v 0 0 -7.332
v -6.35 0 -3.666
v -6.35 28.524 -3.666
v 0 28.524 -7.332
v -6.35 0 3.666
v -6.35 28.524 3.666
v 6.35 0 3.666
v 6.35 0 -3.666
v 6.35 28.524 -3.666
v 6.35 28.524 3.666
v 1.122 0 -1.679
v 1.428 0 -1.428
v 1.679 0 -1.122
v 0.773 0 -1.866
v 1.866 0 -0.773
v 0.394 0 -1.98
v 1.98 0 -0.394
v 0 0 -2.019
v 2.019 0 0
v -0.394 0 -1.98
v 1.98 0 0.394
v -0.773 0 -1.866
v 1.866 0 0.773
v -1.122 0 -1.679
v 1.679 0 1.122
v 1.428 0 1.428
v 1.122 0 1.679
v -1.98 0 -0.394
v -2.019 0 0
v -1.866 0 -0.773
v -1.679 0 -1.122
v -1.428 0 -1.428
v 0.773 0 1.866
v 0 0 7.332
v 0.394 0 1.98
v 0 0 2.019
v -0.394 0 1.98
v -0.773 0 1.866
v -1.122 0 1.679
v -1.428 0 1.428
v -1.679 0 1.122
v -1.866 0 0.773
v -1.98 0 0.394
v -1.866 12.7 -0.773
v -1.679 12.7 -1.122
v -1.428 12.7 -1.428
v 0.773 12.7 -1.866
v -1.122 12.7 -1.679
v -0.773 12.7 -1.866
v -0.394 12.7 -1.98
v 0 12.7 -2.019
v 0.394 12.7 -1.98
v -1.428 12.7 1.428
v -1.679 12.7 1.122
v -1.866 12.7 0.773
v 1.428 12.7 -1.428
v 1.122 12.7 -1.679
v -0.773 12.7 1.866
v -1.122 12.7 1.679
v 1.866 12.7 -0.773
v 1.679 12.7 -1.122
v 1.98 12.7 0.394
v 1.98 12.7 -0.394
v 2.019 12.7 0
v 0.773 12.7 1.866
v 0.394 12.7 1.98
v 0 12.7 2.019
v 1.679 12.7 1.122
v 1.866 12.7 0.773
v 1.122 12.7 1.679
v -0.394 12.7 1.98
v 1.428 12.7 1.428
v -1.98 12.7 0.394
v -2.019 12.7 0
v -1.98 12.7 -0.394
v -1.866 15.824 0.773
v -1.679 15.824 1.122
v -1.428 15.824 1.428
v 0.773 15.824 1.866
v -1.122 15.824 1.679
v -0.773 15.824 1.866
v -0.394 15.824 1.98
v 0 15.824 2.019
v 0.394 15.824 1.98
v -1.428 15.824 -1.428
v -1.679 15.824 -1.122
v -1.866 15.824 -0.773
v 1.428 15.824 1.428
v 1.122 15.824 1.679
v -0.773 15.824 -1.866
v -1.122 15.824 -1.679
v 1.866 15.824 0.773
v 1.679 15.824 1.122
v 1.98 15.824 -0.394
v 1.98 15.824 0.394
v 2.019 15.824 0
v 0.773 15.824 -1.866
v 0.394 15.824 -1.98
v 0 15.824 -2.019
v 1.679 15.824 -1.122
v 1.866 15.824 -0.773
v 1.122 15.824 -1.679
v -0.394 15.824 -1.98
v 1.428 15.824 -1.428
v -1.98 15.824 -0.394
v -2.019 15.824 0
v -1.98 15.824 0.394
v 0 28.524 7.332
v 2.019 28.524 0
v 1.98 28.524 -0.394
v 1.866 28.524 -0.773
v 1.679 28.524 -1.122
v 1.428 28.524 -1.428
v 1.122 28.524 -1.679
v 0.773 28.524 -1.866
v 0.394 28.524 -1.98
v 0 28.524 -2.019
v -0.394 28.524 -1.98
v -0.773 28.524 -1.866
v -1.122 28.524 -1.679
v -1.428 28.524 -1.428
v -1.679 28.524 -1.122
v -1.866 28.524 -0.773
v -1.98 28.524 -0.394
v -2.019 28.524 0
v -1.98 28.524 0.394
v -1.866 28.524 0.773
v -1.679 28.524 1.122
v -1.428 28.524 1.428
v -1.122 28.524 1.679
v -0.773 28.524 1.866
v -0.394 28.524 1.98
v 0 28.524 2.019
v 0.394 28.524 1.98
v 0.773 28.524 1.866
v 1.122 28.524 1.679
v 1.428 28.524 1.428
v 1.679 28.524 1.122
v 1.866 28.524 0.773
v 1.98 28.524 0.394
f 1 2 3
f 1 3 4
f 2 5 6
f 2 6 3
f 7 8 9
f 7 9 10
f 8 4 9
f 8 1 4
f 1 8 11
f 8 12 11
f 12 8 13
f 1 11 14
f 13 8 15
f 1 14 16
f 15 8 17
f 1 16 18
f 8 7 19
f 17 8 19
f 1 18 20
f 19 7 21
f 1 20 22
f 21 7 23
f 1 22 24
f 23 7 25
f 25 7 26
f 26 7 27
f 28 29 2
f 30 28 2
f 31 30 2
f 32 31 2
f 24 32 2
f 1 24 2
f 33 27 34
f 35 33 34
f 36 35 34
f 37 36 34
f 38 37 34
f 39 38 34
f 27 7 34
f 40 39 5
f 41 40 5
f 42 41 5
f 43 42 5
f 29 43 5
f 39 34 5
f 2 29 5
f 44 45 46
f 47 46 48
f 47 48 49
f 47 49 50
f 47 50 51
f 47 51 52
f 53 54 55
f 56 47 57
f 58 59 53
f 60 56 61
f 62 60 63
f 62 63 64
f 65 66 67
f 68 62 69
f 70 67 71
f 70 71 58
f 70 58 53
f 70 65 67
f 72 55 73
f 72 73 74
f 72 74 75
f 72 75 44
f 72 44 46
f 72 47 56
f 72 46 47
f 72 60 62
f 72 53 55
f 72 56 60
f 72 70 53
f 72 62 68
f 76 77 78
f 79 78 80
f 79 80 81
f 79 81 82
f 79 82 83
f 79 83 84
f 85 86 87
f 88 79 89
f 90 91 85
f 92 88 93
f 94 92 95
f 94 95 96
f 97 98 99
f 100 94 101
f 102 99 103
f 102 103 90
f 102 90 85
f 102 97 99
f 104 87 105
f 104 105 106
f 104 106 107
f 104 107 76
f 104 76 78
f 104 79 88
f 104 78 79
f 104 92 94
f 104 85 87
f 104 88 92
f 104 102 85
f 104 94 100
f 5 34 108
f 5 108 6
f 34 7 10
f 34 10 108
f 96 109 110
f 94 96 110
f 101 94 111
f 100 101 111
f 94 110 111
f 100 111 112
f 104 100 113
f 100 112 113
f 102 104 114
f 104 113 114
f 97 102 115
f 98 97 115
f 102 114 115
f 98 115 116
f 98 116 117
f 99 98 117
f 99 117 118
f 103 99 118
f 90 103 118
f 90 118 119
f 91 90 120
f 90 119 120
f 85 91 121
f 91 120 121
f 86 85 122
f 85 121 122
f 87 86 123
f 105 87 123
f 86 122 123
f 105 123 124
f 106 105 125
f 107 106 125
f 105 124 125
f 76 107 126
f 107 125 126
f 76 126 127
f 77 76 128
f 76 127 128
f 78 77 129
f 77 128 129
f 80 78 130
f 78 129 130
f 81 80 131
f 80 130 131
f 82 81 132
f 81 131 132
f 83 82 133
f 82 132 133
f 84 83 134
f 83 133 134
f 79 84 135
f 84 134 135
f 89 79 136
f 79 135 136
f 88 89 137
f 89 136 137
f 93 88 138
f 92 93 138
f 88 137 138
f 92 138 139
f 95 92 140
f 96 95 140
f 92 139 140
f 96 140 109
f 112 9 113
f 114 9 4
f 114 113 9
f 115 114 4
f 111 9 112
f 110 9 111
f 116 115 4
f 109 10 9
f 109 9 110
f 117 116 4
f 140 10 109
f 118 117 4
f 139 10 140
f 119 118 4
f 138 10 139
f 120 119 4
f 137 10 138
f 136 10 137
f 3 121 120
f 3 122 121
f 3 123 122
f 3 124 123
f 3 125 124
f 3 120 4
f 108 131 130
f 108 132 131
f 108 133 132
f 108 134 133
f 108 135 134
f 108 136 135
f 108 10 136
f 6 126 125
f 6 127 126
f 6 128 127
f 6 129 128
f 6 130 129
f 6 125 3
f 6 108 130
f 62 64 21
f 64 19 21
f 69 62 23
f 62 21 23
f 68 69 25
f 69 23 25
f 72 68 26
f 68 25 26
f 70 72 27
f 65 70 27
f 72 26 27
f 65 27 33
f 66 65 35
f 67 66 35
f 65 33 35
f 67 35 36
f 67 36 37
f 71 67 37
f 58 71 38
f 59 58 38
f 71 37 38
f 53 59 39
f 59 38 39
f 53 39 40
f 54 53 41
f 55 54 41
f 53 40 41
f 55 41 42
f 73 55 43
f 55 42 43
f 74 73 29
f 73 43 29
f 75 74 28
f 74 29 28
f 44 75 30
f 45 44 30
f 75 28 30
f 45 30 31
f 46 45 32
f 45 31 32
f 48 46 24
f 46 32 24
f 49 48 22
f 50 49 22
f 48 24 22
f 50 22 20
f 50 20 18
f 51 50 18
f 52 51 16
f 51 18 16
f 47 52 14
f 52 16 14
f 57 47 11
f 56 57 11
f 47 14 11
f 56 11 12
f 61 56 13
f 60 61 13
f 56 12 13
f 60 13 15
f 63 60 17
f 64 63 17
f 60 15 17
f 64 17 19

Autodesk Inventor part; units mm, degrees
ref_plane "YZ Plane" through (0, 0, 0) normal (1, 0, 0) x (0, 1, 0)
ref_plane "XZ Plane" through (0, 0, 0) normal (0, 1, 0) x (-1, 0, 0)
ref_plane "XY Plane" through (0, 0, 0) normal (0, 0, 1) x (1, 0, 0)
sketch "Sketch1" plane through (0, 0, 0) normal (0, 1, 0) x (-1, 0, 0)
  line L0 (0, 7.3323) -> (6.35, 3.6662)
  line L1 (6.35, 3.6662) -> (6.35, -3.6662)
  line L2 (6.35, -3.6662) -> (0, -7.3323)
  line L3 (0, -7.3323) -> (-6.35, -3.6662)
  line L4 (-6.35, -3.6662) -> (-6.35, 3.6662)
  line L5 (-6.35, 3.6662) -> (0, 7.3323)
  point P0 (0, 0)
  point P1 (0, 0)
  dimension "d0" = 12.7
extrude "Extrusion1" add sketch "Sketch1" along normal blind 28.5242
sketch "Sketch2" plane through (0, 28.5242, 0) normal (0, 1, 0) x (1, 0, 0)
  circle A0 centre (0, 0) radius 2.0193
  dimension "d3" = 4.0386
extrude "Extrusion2" cut sketch "Sketch2" against normal blind 12.7
sketch "Sketch3" plane through (0, 0, 0) normal (0, -1, 0) x (1, 0, 0)
  circle A0 centre (0, 0) radius 2.0193
  dimension "d6" = 4.0386
extrude "Extrusion3" cut sketch "Sketch3" against normal blind 12.7
thread "Thread1" size "10-32 UNF" class "2B" standard "ANSI Unified Screw Threads" length 20
thread "Thread2" size "10-32 UNF" class "2B" standard "ANSI Unified Screw Threads" length 20
properties part number "DTraining2_001_E1Shaft"
